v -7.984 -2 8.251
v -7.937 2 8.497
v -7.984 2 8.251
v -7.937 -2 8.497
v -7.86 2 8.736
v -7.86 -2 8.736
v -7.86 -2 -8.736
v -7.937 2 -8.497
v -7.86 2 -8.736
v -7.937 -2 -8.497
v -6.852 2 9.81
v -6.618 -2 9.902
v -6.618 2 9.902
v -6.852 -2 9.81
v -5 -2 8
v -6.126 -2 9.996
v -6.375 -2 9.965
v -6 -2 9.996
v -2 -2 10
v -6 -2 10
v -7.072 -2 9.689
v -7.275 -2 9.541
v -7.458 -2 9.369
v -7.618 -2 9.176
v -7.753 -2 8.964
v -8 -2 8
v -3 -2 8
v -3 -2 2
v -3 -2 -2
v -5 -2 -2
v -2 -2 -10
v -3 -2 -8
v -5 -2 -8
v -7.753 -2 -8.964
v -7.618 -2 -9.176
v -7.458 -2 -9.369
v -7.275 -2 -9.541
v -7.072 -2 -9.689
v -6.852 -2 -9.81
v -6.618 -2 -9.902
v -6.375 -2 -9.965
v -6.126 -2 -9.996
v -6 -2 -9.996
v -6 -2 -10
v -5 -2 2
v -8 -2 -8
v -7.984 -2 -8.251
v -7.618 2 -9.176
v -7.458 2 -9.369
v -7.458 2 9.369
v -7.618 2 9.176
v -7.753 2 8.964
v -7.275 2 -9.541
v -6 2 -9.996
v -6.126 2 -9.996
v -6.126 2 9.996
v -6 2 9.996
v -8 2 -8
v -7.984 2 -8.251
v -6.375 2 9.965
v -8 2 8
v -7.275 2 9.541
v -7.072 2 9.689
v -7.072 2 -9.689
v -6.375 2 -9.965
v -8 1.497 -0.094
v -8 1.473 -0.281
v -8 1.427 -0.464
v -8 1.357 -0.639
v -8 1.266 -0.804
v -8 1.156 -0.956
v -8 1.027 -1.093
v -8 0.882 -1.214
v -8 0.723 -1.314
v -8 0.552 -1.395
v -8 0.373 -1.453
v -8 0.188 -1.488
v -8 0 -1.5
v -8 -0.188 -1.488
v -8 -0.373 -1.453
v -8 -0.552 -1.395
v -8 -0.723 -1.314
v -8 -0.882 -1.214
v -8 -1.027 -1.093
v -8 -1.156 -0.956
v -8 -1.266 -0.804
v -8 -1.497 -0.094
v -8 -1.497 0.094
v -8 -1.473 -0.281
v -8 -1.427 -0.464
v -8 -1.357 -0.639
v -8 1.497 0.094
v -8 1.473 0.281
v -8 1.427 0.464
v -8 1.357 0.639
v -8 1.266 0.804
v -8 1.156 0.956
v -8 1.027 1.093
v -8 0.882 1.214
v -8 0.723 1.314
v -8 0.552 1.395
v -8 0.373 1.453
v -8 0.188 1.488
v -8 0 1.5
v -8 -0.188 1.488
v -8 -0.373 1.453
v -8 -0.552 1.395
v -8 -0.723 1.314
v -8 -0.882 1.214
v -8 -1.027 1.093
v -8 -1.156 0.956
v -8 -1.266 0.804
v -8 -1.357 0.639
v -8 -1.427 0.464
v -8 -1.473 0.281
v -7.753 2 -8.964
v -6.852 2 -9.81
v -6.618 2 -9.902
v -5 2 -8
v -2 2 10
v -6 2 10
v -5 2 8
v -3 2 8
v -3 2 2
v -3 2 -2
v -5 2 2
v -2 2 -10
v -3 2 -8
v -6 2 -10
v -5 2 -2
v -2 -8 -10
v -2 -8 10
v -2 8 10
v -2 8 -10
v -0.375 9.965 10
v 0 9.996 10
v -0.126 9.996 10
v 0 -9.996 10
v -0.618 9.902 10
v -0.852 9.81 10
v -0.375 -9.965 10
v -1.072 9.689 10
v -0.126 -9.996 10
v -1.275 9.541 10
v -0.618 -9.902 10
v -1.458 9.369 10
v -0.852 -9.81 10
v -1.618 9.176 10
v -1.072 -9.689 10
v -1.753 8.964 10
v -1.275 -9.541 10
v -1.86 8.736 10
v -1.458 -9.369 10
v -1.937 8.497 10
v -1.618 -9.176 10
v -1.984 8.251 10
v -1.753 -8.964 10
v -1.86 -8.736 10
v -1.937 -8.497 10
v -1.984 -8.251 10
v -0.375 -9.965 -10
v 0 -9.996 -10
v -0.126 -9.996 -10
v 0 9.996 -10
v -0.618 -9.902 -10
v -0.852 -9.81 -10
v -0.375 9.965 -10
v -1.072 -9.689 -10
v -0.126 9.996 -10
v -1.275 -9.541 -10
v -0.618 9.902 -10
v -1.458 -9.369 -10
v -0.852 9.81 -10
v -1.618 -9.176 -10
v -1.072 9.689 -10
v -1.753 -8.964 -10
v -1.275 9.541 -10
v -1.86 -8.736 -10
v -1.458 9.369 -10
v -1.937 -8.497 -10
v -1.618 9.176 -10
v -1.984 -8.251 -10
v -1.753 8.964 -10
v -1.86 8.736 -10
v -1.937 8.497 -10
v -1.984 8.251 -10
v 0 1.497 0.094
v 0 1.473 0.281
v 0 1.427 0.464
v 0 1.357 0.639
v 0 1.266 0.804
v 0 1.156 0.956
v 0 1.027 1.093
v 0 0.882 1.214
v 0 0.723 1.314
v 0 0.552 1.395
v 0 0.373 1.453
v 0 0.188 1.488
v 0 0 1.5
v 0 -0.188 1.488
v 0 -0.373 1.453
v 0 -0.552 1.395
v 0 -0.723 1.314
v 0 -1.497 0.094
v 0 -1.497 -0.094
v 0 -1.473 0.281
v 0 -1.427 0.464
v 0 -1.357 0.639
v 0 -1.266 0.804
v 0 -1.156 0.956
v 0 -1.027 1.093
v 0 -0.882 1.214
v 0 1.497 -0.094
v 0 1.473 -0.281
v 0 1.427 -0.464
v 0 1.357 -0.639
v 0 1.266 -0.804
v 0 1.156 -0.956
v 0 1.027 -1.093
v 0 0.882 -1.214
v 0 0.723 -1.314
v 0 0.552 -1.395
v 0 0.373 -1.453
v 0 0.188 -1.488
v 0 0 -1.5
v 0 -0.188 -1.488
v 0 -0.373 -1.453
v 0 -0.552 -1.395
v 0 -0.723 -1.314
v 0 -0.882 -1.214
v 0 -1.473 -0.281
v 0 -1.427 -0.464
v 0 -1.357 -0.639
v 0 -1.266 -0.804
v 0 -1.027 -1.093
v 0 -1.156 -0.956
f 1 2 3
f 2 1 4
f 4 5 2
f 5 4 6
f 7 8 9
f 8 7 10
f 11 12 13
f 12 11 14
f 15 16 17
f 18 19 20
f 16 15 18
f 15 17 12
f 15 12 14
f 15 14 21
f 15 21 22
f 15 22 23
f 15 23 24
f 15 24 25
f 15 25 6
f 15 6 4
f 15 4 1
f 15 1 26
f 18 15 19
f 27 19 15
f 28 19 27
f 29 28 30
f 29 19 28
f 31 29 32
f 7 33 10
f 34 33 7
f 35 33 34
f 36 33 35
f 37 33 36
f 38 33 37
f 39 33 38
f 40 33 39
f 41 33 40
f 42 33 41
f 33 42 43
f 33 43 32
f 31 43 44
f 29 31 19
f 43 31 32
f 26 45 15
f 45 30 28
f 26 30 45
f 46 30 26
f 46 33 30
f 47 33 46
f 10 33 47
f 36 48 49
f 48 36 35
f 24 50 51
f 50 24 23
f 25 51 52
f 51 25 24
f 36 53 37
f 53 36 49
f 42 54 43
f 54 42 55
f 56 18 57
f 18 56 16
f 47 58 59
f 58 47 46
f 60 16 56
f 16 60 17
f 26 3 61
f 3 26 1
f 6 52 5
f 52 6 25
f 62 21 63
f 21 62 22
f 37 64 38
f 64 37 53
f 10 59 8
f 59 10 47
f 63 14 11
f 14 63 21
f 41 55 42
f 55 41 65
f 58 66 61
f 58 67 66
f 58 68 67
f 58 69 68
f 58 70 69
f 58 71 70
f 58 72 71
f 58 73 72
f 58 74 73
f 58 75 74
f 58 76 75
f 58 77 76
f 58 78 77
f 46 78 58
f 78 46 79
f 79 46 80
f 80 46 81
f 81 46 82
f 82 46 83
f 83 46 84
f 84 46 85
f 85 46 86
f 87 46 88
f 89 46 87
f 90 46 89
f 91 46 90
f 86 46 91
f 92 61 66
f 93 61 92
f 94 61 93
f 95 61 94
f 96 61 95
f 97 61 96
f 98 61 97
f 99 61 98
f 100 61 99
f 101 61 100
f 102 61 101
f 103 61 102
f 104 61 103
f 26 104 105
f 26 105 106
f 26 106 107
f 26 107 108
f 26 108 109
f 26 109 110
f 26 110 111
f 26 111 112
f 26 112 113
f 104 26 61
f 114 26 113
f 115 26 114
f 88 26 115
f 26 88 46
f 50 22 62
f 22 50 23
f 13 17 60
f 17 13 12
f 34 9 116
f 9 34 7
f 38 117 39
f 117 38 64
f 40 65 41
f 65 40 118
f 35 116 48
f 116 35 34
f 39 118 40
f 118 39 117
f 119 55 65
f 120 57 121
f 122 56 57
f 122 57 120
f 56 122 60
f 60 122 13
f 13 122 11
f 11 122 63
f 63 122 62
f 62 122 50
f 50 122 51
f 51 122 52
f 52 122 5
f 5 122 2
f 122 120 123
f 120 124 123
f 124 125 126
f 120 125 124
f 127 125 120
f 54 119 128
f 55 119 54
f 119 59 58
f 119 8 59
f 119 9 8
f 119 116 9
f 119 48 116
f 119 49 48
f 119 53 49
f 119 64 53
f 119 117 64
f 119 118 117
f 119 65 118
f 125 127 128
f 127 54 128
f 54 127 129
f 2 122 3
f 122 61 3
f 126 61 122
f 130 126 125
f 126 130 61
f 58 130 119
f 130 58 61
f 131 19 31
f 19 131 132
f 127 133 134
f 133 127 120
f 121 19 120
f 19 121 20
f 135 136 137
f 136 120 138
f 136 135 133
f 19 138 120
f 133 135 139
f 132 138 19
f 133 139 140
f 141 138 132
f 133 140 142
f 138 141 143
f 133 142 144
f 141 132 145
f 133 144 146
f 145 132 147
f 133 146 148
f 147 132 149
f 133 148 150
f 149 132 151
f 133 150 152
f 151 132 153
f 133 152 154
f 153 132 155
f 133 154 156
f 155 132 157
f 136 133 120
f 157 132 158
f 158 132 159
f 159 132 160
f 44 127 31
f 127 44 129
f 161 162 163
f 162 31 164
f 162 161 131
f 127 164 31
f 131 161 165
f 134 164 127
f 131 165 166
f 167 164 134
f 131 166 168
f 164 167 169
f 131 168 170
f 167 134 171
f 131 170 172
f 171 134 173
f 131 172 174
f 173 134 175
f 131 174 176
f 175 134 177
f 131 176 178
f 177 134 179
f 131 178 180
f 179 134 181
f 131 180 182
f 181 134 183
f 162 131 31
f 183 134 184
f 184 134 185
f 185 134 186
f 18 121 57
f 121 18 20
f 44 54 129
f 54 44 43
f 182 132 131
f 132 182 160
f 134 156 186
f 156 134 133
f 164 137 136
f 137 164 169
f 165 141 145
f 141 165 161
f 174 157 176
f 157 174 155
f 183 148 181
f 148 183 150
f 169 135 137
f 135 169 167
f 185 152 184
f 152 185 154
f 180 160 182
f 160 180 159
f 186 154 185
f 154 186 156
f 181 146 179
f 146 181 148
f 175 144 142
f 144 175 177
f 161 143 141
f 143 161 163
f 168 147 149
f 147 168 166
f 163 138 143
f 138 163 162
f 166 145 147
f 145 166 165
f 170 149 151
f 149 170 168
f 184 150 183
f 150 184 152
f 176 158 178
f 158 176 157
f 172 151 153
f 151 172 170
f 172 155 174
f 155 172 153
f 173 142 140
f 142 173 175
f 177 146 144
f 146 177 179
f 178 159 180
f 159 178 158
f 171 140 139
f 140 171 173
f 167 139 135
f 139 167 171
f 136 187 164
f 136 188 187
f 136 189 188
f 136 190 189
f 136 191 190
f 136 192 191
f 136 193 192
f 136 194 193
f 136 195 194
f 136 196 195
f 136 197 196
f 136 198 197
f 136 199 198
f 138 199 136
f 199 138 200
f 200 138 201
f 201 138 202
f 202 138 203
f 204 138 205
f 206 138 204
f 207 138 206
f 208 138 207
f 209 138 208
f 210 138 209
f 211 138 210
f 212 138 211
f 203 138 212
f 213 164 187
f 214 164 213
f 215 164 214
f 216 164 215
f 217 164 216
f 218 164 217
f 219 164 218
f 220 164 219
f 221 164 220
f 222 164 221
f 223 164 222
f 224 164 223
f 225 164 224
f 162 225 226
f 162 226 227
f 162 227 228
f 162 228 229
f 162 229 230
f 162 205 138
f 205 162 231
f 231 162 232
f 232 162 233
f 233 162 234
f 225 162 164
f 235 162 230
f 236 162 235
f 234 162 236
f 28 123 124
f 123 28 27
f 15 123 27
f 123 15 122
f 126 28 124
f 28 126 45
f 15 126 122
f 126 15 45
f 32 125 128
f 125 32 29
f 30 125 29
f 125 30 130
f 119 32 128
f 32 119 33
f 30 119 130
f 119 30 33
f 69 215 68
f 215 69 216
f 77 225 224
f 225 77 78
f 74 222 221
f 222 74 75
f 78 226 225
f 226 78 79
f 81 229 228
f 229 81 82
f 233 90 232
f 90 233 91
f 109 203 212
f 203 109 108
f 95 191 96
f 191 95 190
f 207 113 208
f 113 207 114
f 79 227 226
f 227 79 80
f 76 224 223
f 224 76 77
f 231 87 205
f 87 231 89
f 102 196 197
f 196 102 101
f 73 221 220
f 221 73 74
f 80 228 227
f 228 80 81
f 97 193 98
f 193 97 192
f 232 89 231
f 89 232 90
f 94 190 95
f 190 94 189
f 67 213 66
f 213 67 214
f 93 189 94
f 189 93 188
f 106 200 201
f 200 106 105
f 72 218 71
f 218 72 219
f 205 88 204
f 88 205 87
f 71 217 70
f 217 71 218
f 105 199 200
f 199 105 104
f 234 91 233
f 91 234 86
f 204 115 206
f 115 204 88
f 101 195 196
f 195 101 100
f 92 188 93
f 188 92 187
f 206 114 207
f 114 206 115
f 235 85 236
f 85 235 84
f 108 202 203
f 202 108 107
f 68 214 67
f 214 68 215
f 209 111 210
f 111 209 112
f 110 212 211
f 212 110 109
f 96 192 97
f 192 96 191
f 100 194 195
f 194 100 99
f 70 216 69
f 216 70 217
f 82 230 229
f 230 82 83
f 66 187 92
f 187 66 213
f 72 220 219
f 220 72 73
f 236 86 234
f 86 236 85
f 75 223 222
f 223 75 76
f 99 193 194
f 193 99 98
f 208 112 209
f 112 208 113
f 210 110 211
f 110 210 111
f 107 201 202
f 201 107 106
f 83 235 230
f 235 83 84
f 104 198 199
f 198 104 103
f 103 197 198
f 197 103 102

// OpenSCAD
////////////////////////////////////////VARIABLES///////////////////////////////////
////////////////////////////////////////////////////////////////////////////////////

Plate_width = 20; //[10:30]
Tie_pos = 2; //[1:0.5:3]
Holder_height = 20; //[18:30]
Holder_blk = 4; //[3.5:0.5:6] 
Tie_thickness = 2; //[1:0.5:3] 
Tie_width = 6; // [3:0.5:6] 
Holder_type = "flat"; // [flat,curve] 
Center_hole = "yes"; // [yes,no]

/* [Hidden] */
holedia = 3 ; // center hole

//////////////////////////////////////////RENDER////////////////////////////////////
////////////////////////////////////////////////////////////////////////////////////

if (Holder_type == "curve")
{curvedholder();}
else if (Holder_type == "flat")
{flatholder();}

//////////////////////////////////////////MODULES///////////////////////////////////
////////////////////////////////////////////////////////////////////////////////////

module flatholder()
{
    difference()
    {
        union()
        {
        translate([-Holder_blk-(Holder_blk/2),0,0])straight();
        difference()
        {
            hull()
            {
                translate([0,-((Plate_width/2)-(Holder_blk/2)),0])cylinder(h=Holder_height,d=Holder_blk,center=true,$fn=50);
                translate([0,((Plate_width/2)-(Holder_blk/2)),0])cylinder(h=Holder_height,d=Holder_blk,center=true,$fn=50);
            }
            translate([Holder_blk/2,0,0])cube([Holder_blk,Plate_width+Holder_blk,Holder_height+1],center=true);
        }
        }
        translate([Plate_width/2,0,0]) holes();
    }
}

module curvedholder()
{
    difference()
    {
        union()
        {
            curve();
            translate ([-((Plate_width/2)+(Tie_pos/2)+(Holder_blk)),0,0]) straight();
        }
        holes();
    }
}

module holes()
{
translate([-((Plate_width/2)+Tie_pos+(Holder_blk/2)),0,Holder_height/4]) cube([Tie_thickness,Holder_blk*2,Tie_width],center=true);
translate([-((Plate_width/2)+Tie_pos+(Holder_blk/2)),0,-Holder_height/4]) cube([Tie_thickness,Holder_blk*2,Tie_width],center=true);
if (Center_hole == "yes") {translate([-((Plate_width/2)+(Tie_pos/2)+(Holder_blk/2)),0,0]) rotate([0,90,0]) cylinder(h=Holder_blk*3, d=holedia,center=true,$fn=50);}
}
module straight()
{
    hull()
    {
    translate([0,0,((Holder_height/2)-(Holder_blk/2))]) rotate([90,0,0]) cylinder(h=Holder_blk,d=Holder_blk,center=true,$fn=50);
    translate([0,0,-((Holder_height/2)-(Holder_blk/2))]) rotate([90,0,0]) cylinder(h=Holder_blk,d=Holder_blk,center=true,$fn=50);
    }

    translate([Holder_blk/2,0,0])cube([Holder_blk,Holder_blk,Holder_height],center=true);
}

module curve()
{
    difference()
    {
        union()
        {
            cylinder(h=Holder_height,d=Plate_width+(Tie_pos*2),center=true,$fn=150);
            
        }
        union()
        {
            cylinder(h=Holder_height+1,d=Plate_width,center=true,$fn=150);
            translate([15,0,0]) cube([30,40,26],center=true);
        }
    }
    
    translate([0,-(Plate_width/2+(Tie_pos/2)),0])cylinder(h=Holder_height,d=Tie_pos,center=true,$fn=50);
            translate([0,(Plate_width/2+(Tie_pos/2)),0])cylinder(h=Holder_height,d=Tie_pos,center=true,$fn=50);
    
}
